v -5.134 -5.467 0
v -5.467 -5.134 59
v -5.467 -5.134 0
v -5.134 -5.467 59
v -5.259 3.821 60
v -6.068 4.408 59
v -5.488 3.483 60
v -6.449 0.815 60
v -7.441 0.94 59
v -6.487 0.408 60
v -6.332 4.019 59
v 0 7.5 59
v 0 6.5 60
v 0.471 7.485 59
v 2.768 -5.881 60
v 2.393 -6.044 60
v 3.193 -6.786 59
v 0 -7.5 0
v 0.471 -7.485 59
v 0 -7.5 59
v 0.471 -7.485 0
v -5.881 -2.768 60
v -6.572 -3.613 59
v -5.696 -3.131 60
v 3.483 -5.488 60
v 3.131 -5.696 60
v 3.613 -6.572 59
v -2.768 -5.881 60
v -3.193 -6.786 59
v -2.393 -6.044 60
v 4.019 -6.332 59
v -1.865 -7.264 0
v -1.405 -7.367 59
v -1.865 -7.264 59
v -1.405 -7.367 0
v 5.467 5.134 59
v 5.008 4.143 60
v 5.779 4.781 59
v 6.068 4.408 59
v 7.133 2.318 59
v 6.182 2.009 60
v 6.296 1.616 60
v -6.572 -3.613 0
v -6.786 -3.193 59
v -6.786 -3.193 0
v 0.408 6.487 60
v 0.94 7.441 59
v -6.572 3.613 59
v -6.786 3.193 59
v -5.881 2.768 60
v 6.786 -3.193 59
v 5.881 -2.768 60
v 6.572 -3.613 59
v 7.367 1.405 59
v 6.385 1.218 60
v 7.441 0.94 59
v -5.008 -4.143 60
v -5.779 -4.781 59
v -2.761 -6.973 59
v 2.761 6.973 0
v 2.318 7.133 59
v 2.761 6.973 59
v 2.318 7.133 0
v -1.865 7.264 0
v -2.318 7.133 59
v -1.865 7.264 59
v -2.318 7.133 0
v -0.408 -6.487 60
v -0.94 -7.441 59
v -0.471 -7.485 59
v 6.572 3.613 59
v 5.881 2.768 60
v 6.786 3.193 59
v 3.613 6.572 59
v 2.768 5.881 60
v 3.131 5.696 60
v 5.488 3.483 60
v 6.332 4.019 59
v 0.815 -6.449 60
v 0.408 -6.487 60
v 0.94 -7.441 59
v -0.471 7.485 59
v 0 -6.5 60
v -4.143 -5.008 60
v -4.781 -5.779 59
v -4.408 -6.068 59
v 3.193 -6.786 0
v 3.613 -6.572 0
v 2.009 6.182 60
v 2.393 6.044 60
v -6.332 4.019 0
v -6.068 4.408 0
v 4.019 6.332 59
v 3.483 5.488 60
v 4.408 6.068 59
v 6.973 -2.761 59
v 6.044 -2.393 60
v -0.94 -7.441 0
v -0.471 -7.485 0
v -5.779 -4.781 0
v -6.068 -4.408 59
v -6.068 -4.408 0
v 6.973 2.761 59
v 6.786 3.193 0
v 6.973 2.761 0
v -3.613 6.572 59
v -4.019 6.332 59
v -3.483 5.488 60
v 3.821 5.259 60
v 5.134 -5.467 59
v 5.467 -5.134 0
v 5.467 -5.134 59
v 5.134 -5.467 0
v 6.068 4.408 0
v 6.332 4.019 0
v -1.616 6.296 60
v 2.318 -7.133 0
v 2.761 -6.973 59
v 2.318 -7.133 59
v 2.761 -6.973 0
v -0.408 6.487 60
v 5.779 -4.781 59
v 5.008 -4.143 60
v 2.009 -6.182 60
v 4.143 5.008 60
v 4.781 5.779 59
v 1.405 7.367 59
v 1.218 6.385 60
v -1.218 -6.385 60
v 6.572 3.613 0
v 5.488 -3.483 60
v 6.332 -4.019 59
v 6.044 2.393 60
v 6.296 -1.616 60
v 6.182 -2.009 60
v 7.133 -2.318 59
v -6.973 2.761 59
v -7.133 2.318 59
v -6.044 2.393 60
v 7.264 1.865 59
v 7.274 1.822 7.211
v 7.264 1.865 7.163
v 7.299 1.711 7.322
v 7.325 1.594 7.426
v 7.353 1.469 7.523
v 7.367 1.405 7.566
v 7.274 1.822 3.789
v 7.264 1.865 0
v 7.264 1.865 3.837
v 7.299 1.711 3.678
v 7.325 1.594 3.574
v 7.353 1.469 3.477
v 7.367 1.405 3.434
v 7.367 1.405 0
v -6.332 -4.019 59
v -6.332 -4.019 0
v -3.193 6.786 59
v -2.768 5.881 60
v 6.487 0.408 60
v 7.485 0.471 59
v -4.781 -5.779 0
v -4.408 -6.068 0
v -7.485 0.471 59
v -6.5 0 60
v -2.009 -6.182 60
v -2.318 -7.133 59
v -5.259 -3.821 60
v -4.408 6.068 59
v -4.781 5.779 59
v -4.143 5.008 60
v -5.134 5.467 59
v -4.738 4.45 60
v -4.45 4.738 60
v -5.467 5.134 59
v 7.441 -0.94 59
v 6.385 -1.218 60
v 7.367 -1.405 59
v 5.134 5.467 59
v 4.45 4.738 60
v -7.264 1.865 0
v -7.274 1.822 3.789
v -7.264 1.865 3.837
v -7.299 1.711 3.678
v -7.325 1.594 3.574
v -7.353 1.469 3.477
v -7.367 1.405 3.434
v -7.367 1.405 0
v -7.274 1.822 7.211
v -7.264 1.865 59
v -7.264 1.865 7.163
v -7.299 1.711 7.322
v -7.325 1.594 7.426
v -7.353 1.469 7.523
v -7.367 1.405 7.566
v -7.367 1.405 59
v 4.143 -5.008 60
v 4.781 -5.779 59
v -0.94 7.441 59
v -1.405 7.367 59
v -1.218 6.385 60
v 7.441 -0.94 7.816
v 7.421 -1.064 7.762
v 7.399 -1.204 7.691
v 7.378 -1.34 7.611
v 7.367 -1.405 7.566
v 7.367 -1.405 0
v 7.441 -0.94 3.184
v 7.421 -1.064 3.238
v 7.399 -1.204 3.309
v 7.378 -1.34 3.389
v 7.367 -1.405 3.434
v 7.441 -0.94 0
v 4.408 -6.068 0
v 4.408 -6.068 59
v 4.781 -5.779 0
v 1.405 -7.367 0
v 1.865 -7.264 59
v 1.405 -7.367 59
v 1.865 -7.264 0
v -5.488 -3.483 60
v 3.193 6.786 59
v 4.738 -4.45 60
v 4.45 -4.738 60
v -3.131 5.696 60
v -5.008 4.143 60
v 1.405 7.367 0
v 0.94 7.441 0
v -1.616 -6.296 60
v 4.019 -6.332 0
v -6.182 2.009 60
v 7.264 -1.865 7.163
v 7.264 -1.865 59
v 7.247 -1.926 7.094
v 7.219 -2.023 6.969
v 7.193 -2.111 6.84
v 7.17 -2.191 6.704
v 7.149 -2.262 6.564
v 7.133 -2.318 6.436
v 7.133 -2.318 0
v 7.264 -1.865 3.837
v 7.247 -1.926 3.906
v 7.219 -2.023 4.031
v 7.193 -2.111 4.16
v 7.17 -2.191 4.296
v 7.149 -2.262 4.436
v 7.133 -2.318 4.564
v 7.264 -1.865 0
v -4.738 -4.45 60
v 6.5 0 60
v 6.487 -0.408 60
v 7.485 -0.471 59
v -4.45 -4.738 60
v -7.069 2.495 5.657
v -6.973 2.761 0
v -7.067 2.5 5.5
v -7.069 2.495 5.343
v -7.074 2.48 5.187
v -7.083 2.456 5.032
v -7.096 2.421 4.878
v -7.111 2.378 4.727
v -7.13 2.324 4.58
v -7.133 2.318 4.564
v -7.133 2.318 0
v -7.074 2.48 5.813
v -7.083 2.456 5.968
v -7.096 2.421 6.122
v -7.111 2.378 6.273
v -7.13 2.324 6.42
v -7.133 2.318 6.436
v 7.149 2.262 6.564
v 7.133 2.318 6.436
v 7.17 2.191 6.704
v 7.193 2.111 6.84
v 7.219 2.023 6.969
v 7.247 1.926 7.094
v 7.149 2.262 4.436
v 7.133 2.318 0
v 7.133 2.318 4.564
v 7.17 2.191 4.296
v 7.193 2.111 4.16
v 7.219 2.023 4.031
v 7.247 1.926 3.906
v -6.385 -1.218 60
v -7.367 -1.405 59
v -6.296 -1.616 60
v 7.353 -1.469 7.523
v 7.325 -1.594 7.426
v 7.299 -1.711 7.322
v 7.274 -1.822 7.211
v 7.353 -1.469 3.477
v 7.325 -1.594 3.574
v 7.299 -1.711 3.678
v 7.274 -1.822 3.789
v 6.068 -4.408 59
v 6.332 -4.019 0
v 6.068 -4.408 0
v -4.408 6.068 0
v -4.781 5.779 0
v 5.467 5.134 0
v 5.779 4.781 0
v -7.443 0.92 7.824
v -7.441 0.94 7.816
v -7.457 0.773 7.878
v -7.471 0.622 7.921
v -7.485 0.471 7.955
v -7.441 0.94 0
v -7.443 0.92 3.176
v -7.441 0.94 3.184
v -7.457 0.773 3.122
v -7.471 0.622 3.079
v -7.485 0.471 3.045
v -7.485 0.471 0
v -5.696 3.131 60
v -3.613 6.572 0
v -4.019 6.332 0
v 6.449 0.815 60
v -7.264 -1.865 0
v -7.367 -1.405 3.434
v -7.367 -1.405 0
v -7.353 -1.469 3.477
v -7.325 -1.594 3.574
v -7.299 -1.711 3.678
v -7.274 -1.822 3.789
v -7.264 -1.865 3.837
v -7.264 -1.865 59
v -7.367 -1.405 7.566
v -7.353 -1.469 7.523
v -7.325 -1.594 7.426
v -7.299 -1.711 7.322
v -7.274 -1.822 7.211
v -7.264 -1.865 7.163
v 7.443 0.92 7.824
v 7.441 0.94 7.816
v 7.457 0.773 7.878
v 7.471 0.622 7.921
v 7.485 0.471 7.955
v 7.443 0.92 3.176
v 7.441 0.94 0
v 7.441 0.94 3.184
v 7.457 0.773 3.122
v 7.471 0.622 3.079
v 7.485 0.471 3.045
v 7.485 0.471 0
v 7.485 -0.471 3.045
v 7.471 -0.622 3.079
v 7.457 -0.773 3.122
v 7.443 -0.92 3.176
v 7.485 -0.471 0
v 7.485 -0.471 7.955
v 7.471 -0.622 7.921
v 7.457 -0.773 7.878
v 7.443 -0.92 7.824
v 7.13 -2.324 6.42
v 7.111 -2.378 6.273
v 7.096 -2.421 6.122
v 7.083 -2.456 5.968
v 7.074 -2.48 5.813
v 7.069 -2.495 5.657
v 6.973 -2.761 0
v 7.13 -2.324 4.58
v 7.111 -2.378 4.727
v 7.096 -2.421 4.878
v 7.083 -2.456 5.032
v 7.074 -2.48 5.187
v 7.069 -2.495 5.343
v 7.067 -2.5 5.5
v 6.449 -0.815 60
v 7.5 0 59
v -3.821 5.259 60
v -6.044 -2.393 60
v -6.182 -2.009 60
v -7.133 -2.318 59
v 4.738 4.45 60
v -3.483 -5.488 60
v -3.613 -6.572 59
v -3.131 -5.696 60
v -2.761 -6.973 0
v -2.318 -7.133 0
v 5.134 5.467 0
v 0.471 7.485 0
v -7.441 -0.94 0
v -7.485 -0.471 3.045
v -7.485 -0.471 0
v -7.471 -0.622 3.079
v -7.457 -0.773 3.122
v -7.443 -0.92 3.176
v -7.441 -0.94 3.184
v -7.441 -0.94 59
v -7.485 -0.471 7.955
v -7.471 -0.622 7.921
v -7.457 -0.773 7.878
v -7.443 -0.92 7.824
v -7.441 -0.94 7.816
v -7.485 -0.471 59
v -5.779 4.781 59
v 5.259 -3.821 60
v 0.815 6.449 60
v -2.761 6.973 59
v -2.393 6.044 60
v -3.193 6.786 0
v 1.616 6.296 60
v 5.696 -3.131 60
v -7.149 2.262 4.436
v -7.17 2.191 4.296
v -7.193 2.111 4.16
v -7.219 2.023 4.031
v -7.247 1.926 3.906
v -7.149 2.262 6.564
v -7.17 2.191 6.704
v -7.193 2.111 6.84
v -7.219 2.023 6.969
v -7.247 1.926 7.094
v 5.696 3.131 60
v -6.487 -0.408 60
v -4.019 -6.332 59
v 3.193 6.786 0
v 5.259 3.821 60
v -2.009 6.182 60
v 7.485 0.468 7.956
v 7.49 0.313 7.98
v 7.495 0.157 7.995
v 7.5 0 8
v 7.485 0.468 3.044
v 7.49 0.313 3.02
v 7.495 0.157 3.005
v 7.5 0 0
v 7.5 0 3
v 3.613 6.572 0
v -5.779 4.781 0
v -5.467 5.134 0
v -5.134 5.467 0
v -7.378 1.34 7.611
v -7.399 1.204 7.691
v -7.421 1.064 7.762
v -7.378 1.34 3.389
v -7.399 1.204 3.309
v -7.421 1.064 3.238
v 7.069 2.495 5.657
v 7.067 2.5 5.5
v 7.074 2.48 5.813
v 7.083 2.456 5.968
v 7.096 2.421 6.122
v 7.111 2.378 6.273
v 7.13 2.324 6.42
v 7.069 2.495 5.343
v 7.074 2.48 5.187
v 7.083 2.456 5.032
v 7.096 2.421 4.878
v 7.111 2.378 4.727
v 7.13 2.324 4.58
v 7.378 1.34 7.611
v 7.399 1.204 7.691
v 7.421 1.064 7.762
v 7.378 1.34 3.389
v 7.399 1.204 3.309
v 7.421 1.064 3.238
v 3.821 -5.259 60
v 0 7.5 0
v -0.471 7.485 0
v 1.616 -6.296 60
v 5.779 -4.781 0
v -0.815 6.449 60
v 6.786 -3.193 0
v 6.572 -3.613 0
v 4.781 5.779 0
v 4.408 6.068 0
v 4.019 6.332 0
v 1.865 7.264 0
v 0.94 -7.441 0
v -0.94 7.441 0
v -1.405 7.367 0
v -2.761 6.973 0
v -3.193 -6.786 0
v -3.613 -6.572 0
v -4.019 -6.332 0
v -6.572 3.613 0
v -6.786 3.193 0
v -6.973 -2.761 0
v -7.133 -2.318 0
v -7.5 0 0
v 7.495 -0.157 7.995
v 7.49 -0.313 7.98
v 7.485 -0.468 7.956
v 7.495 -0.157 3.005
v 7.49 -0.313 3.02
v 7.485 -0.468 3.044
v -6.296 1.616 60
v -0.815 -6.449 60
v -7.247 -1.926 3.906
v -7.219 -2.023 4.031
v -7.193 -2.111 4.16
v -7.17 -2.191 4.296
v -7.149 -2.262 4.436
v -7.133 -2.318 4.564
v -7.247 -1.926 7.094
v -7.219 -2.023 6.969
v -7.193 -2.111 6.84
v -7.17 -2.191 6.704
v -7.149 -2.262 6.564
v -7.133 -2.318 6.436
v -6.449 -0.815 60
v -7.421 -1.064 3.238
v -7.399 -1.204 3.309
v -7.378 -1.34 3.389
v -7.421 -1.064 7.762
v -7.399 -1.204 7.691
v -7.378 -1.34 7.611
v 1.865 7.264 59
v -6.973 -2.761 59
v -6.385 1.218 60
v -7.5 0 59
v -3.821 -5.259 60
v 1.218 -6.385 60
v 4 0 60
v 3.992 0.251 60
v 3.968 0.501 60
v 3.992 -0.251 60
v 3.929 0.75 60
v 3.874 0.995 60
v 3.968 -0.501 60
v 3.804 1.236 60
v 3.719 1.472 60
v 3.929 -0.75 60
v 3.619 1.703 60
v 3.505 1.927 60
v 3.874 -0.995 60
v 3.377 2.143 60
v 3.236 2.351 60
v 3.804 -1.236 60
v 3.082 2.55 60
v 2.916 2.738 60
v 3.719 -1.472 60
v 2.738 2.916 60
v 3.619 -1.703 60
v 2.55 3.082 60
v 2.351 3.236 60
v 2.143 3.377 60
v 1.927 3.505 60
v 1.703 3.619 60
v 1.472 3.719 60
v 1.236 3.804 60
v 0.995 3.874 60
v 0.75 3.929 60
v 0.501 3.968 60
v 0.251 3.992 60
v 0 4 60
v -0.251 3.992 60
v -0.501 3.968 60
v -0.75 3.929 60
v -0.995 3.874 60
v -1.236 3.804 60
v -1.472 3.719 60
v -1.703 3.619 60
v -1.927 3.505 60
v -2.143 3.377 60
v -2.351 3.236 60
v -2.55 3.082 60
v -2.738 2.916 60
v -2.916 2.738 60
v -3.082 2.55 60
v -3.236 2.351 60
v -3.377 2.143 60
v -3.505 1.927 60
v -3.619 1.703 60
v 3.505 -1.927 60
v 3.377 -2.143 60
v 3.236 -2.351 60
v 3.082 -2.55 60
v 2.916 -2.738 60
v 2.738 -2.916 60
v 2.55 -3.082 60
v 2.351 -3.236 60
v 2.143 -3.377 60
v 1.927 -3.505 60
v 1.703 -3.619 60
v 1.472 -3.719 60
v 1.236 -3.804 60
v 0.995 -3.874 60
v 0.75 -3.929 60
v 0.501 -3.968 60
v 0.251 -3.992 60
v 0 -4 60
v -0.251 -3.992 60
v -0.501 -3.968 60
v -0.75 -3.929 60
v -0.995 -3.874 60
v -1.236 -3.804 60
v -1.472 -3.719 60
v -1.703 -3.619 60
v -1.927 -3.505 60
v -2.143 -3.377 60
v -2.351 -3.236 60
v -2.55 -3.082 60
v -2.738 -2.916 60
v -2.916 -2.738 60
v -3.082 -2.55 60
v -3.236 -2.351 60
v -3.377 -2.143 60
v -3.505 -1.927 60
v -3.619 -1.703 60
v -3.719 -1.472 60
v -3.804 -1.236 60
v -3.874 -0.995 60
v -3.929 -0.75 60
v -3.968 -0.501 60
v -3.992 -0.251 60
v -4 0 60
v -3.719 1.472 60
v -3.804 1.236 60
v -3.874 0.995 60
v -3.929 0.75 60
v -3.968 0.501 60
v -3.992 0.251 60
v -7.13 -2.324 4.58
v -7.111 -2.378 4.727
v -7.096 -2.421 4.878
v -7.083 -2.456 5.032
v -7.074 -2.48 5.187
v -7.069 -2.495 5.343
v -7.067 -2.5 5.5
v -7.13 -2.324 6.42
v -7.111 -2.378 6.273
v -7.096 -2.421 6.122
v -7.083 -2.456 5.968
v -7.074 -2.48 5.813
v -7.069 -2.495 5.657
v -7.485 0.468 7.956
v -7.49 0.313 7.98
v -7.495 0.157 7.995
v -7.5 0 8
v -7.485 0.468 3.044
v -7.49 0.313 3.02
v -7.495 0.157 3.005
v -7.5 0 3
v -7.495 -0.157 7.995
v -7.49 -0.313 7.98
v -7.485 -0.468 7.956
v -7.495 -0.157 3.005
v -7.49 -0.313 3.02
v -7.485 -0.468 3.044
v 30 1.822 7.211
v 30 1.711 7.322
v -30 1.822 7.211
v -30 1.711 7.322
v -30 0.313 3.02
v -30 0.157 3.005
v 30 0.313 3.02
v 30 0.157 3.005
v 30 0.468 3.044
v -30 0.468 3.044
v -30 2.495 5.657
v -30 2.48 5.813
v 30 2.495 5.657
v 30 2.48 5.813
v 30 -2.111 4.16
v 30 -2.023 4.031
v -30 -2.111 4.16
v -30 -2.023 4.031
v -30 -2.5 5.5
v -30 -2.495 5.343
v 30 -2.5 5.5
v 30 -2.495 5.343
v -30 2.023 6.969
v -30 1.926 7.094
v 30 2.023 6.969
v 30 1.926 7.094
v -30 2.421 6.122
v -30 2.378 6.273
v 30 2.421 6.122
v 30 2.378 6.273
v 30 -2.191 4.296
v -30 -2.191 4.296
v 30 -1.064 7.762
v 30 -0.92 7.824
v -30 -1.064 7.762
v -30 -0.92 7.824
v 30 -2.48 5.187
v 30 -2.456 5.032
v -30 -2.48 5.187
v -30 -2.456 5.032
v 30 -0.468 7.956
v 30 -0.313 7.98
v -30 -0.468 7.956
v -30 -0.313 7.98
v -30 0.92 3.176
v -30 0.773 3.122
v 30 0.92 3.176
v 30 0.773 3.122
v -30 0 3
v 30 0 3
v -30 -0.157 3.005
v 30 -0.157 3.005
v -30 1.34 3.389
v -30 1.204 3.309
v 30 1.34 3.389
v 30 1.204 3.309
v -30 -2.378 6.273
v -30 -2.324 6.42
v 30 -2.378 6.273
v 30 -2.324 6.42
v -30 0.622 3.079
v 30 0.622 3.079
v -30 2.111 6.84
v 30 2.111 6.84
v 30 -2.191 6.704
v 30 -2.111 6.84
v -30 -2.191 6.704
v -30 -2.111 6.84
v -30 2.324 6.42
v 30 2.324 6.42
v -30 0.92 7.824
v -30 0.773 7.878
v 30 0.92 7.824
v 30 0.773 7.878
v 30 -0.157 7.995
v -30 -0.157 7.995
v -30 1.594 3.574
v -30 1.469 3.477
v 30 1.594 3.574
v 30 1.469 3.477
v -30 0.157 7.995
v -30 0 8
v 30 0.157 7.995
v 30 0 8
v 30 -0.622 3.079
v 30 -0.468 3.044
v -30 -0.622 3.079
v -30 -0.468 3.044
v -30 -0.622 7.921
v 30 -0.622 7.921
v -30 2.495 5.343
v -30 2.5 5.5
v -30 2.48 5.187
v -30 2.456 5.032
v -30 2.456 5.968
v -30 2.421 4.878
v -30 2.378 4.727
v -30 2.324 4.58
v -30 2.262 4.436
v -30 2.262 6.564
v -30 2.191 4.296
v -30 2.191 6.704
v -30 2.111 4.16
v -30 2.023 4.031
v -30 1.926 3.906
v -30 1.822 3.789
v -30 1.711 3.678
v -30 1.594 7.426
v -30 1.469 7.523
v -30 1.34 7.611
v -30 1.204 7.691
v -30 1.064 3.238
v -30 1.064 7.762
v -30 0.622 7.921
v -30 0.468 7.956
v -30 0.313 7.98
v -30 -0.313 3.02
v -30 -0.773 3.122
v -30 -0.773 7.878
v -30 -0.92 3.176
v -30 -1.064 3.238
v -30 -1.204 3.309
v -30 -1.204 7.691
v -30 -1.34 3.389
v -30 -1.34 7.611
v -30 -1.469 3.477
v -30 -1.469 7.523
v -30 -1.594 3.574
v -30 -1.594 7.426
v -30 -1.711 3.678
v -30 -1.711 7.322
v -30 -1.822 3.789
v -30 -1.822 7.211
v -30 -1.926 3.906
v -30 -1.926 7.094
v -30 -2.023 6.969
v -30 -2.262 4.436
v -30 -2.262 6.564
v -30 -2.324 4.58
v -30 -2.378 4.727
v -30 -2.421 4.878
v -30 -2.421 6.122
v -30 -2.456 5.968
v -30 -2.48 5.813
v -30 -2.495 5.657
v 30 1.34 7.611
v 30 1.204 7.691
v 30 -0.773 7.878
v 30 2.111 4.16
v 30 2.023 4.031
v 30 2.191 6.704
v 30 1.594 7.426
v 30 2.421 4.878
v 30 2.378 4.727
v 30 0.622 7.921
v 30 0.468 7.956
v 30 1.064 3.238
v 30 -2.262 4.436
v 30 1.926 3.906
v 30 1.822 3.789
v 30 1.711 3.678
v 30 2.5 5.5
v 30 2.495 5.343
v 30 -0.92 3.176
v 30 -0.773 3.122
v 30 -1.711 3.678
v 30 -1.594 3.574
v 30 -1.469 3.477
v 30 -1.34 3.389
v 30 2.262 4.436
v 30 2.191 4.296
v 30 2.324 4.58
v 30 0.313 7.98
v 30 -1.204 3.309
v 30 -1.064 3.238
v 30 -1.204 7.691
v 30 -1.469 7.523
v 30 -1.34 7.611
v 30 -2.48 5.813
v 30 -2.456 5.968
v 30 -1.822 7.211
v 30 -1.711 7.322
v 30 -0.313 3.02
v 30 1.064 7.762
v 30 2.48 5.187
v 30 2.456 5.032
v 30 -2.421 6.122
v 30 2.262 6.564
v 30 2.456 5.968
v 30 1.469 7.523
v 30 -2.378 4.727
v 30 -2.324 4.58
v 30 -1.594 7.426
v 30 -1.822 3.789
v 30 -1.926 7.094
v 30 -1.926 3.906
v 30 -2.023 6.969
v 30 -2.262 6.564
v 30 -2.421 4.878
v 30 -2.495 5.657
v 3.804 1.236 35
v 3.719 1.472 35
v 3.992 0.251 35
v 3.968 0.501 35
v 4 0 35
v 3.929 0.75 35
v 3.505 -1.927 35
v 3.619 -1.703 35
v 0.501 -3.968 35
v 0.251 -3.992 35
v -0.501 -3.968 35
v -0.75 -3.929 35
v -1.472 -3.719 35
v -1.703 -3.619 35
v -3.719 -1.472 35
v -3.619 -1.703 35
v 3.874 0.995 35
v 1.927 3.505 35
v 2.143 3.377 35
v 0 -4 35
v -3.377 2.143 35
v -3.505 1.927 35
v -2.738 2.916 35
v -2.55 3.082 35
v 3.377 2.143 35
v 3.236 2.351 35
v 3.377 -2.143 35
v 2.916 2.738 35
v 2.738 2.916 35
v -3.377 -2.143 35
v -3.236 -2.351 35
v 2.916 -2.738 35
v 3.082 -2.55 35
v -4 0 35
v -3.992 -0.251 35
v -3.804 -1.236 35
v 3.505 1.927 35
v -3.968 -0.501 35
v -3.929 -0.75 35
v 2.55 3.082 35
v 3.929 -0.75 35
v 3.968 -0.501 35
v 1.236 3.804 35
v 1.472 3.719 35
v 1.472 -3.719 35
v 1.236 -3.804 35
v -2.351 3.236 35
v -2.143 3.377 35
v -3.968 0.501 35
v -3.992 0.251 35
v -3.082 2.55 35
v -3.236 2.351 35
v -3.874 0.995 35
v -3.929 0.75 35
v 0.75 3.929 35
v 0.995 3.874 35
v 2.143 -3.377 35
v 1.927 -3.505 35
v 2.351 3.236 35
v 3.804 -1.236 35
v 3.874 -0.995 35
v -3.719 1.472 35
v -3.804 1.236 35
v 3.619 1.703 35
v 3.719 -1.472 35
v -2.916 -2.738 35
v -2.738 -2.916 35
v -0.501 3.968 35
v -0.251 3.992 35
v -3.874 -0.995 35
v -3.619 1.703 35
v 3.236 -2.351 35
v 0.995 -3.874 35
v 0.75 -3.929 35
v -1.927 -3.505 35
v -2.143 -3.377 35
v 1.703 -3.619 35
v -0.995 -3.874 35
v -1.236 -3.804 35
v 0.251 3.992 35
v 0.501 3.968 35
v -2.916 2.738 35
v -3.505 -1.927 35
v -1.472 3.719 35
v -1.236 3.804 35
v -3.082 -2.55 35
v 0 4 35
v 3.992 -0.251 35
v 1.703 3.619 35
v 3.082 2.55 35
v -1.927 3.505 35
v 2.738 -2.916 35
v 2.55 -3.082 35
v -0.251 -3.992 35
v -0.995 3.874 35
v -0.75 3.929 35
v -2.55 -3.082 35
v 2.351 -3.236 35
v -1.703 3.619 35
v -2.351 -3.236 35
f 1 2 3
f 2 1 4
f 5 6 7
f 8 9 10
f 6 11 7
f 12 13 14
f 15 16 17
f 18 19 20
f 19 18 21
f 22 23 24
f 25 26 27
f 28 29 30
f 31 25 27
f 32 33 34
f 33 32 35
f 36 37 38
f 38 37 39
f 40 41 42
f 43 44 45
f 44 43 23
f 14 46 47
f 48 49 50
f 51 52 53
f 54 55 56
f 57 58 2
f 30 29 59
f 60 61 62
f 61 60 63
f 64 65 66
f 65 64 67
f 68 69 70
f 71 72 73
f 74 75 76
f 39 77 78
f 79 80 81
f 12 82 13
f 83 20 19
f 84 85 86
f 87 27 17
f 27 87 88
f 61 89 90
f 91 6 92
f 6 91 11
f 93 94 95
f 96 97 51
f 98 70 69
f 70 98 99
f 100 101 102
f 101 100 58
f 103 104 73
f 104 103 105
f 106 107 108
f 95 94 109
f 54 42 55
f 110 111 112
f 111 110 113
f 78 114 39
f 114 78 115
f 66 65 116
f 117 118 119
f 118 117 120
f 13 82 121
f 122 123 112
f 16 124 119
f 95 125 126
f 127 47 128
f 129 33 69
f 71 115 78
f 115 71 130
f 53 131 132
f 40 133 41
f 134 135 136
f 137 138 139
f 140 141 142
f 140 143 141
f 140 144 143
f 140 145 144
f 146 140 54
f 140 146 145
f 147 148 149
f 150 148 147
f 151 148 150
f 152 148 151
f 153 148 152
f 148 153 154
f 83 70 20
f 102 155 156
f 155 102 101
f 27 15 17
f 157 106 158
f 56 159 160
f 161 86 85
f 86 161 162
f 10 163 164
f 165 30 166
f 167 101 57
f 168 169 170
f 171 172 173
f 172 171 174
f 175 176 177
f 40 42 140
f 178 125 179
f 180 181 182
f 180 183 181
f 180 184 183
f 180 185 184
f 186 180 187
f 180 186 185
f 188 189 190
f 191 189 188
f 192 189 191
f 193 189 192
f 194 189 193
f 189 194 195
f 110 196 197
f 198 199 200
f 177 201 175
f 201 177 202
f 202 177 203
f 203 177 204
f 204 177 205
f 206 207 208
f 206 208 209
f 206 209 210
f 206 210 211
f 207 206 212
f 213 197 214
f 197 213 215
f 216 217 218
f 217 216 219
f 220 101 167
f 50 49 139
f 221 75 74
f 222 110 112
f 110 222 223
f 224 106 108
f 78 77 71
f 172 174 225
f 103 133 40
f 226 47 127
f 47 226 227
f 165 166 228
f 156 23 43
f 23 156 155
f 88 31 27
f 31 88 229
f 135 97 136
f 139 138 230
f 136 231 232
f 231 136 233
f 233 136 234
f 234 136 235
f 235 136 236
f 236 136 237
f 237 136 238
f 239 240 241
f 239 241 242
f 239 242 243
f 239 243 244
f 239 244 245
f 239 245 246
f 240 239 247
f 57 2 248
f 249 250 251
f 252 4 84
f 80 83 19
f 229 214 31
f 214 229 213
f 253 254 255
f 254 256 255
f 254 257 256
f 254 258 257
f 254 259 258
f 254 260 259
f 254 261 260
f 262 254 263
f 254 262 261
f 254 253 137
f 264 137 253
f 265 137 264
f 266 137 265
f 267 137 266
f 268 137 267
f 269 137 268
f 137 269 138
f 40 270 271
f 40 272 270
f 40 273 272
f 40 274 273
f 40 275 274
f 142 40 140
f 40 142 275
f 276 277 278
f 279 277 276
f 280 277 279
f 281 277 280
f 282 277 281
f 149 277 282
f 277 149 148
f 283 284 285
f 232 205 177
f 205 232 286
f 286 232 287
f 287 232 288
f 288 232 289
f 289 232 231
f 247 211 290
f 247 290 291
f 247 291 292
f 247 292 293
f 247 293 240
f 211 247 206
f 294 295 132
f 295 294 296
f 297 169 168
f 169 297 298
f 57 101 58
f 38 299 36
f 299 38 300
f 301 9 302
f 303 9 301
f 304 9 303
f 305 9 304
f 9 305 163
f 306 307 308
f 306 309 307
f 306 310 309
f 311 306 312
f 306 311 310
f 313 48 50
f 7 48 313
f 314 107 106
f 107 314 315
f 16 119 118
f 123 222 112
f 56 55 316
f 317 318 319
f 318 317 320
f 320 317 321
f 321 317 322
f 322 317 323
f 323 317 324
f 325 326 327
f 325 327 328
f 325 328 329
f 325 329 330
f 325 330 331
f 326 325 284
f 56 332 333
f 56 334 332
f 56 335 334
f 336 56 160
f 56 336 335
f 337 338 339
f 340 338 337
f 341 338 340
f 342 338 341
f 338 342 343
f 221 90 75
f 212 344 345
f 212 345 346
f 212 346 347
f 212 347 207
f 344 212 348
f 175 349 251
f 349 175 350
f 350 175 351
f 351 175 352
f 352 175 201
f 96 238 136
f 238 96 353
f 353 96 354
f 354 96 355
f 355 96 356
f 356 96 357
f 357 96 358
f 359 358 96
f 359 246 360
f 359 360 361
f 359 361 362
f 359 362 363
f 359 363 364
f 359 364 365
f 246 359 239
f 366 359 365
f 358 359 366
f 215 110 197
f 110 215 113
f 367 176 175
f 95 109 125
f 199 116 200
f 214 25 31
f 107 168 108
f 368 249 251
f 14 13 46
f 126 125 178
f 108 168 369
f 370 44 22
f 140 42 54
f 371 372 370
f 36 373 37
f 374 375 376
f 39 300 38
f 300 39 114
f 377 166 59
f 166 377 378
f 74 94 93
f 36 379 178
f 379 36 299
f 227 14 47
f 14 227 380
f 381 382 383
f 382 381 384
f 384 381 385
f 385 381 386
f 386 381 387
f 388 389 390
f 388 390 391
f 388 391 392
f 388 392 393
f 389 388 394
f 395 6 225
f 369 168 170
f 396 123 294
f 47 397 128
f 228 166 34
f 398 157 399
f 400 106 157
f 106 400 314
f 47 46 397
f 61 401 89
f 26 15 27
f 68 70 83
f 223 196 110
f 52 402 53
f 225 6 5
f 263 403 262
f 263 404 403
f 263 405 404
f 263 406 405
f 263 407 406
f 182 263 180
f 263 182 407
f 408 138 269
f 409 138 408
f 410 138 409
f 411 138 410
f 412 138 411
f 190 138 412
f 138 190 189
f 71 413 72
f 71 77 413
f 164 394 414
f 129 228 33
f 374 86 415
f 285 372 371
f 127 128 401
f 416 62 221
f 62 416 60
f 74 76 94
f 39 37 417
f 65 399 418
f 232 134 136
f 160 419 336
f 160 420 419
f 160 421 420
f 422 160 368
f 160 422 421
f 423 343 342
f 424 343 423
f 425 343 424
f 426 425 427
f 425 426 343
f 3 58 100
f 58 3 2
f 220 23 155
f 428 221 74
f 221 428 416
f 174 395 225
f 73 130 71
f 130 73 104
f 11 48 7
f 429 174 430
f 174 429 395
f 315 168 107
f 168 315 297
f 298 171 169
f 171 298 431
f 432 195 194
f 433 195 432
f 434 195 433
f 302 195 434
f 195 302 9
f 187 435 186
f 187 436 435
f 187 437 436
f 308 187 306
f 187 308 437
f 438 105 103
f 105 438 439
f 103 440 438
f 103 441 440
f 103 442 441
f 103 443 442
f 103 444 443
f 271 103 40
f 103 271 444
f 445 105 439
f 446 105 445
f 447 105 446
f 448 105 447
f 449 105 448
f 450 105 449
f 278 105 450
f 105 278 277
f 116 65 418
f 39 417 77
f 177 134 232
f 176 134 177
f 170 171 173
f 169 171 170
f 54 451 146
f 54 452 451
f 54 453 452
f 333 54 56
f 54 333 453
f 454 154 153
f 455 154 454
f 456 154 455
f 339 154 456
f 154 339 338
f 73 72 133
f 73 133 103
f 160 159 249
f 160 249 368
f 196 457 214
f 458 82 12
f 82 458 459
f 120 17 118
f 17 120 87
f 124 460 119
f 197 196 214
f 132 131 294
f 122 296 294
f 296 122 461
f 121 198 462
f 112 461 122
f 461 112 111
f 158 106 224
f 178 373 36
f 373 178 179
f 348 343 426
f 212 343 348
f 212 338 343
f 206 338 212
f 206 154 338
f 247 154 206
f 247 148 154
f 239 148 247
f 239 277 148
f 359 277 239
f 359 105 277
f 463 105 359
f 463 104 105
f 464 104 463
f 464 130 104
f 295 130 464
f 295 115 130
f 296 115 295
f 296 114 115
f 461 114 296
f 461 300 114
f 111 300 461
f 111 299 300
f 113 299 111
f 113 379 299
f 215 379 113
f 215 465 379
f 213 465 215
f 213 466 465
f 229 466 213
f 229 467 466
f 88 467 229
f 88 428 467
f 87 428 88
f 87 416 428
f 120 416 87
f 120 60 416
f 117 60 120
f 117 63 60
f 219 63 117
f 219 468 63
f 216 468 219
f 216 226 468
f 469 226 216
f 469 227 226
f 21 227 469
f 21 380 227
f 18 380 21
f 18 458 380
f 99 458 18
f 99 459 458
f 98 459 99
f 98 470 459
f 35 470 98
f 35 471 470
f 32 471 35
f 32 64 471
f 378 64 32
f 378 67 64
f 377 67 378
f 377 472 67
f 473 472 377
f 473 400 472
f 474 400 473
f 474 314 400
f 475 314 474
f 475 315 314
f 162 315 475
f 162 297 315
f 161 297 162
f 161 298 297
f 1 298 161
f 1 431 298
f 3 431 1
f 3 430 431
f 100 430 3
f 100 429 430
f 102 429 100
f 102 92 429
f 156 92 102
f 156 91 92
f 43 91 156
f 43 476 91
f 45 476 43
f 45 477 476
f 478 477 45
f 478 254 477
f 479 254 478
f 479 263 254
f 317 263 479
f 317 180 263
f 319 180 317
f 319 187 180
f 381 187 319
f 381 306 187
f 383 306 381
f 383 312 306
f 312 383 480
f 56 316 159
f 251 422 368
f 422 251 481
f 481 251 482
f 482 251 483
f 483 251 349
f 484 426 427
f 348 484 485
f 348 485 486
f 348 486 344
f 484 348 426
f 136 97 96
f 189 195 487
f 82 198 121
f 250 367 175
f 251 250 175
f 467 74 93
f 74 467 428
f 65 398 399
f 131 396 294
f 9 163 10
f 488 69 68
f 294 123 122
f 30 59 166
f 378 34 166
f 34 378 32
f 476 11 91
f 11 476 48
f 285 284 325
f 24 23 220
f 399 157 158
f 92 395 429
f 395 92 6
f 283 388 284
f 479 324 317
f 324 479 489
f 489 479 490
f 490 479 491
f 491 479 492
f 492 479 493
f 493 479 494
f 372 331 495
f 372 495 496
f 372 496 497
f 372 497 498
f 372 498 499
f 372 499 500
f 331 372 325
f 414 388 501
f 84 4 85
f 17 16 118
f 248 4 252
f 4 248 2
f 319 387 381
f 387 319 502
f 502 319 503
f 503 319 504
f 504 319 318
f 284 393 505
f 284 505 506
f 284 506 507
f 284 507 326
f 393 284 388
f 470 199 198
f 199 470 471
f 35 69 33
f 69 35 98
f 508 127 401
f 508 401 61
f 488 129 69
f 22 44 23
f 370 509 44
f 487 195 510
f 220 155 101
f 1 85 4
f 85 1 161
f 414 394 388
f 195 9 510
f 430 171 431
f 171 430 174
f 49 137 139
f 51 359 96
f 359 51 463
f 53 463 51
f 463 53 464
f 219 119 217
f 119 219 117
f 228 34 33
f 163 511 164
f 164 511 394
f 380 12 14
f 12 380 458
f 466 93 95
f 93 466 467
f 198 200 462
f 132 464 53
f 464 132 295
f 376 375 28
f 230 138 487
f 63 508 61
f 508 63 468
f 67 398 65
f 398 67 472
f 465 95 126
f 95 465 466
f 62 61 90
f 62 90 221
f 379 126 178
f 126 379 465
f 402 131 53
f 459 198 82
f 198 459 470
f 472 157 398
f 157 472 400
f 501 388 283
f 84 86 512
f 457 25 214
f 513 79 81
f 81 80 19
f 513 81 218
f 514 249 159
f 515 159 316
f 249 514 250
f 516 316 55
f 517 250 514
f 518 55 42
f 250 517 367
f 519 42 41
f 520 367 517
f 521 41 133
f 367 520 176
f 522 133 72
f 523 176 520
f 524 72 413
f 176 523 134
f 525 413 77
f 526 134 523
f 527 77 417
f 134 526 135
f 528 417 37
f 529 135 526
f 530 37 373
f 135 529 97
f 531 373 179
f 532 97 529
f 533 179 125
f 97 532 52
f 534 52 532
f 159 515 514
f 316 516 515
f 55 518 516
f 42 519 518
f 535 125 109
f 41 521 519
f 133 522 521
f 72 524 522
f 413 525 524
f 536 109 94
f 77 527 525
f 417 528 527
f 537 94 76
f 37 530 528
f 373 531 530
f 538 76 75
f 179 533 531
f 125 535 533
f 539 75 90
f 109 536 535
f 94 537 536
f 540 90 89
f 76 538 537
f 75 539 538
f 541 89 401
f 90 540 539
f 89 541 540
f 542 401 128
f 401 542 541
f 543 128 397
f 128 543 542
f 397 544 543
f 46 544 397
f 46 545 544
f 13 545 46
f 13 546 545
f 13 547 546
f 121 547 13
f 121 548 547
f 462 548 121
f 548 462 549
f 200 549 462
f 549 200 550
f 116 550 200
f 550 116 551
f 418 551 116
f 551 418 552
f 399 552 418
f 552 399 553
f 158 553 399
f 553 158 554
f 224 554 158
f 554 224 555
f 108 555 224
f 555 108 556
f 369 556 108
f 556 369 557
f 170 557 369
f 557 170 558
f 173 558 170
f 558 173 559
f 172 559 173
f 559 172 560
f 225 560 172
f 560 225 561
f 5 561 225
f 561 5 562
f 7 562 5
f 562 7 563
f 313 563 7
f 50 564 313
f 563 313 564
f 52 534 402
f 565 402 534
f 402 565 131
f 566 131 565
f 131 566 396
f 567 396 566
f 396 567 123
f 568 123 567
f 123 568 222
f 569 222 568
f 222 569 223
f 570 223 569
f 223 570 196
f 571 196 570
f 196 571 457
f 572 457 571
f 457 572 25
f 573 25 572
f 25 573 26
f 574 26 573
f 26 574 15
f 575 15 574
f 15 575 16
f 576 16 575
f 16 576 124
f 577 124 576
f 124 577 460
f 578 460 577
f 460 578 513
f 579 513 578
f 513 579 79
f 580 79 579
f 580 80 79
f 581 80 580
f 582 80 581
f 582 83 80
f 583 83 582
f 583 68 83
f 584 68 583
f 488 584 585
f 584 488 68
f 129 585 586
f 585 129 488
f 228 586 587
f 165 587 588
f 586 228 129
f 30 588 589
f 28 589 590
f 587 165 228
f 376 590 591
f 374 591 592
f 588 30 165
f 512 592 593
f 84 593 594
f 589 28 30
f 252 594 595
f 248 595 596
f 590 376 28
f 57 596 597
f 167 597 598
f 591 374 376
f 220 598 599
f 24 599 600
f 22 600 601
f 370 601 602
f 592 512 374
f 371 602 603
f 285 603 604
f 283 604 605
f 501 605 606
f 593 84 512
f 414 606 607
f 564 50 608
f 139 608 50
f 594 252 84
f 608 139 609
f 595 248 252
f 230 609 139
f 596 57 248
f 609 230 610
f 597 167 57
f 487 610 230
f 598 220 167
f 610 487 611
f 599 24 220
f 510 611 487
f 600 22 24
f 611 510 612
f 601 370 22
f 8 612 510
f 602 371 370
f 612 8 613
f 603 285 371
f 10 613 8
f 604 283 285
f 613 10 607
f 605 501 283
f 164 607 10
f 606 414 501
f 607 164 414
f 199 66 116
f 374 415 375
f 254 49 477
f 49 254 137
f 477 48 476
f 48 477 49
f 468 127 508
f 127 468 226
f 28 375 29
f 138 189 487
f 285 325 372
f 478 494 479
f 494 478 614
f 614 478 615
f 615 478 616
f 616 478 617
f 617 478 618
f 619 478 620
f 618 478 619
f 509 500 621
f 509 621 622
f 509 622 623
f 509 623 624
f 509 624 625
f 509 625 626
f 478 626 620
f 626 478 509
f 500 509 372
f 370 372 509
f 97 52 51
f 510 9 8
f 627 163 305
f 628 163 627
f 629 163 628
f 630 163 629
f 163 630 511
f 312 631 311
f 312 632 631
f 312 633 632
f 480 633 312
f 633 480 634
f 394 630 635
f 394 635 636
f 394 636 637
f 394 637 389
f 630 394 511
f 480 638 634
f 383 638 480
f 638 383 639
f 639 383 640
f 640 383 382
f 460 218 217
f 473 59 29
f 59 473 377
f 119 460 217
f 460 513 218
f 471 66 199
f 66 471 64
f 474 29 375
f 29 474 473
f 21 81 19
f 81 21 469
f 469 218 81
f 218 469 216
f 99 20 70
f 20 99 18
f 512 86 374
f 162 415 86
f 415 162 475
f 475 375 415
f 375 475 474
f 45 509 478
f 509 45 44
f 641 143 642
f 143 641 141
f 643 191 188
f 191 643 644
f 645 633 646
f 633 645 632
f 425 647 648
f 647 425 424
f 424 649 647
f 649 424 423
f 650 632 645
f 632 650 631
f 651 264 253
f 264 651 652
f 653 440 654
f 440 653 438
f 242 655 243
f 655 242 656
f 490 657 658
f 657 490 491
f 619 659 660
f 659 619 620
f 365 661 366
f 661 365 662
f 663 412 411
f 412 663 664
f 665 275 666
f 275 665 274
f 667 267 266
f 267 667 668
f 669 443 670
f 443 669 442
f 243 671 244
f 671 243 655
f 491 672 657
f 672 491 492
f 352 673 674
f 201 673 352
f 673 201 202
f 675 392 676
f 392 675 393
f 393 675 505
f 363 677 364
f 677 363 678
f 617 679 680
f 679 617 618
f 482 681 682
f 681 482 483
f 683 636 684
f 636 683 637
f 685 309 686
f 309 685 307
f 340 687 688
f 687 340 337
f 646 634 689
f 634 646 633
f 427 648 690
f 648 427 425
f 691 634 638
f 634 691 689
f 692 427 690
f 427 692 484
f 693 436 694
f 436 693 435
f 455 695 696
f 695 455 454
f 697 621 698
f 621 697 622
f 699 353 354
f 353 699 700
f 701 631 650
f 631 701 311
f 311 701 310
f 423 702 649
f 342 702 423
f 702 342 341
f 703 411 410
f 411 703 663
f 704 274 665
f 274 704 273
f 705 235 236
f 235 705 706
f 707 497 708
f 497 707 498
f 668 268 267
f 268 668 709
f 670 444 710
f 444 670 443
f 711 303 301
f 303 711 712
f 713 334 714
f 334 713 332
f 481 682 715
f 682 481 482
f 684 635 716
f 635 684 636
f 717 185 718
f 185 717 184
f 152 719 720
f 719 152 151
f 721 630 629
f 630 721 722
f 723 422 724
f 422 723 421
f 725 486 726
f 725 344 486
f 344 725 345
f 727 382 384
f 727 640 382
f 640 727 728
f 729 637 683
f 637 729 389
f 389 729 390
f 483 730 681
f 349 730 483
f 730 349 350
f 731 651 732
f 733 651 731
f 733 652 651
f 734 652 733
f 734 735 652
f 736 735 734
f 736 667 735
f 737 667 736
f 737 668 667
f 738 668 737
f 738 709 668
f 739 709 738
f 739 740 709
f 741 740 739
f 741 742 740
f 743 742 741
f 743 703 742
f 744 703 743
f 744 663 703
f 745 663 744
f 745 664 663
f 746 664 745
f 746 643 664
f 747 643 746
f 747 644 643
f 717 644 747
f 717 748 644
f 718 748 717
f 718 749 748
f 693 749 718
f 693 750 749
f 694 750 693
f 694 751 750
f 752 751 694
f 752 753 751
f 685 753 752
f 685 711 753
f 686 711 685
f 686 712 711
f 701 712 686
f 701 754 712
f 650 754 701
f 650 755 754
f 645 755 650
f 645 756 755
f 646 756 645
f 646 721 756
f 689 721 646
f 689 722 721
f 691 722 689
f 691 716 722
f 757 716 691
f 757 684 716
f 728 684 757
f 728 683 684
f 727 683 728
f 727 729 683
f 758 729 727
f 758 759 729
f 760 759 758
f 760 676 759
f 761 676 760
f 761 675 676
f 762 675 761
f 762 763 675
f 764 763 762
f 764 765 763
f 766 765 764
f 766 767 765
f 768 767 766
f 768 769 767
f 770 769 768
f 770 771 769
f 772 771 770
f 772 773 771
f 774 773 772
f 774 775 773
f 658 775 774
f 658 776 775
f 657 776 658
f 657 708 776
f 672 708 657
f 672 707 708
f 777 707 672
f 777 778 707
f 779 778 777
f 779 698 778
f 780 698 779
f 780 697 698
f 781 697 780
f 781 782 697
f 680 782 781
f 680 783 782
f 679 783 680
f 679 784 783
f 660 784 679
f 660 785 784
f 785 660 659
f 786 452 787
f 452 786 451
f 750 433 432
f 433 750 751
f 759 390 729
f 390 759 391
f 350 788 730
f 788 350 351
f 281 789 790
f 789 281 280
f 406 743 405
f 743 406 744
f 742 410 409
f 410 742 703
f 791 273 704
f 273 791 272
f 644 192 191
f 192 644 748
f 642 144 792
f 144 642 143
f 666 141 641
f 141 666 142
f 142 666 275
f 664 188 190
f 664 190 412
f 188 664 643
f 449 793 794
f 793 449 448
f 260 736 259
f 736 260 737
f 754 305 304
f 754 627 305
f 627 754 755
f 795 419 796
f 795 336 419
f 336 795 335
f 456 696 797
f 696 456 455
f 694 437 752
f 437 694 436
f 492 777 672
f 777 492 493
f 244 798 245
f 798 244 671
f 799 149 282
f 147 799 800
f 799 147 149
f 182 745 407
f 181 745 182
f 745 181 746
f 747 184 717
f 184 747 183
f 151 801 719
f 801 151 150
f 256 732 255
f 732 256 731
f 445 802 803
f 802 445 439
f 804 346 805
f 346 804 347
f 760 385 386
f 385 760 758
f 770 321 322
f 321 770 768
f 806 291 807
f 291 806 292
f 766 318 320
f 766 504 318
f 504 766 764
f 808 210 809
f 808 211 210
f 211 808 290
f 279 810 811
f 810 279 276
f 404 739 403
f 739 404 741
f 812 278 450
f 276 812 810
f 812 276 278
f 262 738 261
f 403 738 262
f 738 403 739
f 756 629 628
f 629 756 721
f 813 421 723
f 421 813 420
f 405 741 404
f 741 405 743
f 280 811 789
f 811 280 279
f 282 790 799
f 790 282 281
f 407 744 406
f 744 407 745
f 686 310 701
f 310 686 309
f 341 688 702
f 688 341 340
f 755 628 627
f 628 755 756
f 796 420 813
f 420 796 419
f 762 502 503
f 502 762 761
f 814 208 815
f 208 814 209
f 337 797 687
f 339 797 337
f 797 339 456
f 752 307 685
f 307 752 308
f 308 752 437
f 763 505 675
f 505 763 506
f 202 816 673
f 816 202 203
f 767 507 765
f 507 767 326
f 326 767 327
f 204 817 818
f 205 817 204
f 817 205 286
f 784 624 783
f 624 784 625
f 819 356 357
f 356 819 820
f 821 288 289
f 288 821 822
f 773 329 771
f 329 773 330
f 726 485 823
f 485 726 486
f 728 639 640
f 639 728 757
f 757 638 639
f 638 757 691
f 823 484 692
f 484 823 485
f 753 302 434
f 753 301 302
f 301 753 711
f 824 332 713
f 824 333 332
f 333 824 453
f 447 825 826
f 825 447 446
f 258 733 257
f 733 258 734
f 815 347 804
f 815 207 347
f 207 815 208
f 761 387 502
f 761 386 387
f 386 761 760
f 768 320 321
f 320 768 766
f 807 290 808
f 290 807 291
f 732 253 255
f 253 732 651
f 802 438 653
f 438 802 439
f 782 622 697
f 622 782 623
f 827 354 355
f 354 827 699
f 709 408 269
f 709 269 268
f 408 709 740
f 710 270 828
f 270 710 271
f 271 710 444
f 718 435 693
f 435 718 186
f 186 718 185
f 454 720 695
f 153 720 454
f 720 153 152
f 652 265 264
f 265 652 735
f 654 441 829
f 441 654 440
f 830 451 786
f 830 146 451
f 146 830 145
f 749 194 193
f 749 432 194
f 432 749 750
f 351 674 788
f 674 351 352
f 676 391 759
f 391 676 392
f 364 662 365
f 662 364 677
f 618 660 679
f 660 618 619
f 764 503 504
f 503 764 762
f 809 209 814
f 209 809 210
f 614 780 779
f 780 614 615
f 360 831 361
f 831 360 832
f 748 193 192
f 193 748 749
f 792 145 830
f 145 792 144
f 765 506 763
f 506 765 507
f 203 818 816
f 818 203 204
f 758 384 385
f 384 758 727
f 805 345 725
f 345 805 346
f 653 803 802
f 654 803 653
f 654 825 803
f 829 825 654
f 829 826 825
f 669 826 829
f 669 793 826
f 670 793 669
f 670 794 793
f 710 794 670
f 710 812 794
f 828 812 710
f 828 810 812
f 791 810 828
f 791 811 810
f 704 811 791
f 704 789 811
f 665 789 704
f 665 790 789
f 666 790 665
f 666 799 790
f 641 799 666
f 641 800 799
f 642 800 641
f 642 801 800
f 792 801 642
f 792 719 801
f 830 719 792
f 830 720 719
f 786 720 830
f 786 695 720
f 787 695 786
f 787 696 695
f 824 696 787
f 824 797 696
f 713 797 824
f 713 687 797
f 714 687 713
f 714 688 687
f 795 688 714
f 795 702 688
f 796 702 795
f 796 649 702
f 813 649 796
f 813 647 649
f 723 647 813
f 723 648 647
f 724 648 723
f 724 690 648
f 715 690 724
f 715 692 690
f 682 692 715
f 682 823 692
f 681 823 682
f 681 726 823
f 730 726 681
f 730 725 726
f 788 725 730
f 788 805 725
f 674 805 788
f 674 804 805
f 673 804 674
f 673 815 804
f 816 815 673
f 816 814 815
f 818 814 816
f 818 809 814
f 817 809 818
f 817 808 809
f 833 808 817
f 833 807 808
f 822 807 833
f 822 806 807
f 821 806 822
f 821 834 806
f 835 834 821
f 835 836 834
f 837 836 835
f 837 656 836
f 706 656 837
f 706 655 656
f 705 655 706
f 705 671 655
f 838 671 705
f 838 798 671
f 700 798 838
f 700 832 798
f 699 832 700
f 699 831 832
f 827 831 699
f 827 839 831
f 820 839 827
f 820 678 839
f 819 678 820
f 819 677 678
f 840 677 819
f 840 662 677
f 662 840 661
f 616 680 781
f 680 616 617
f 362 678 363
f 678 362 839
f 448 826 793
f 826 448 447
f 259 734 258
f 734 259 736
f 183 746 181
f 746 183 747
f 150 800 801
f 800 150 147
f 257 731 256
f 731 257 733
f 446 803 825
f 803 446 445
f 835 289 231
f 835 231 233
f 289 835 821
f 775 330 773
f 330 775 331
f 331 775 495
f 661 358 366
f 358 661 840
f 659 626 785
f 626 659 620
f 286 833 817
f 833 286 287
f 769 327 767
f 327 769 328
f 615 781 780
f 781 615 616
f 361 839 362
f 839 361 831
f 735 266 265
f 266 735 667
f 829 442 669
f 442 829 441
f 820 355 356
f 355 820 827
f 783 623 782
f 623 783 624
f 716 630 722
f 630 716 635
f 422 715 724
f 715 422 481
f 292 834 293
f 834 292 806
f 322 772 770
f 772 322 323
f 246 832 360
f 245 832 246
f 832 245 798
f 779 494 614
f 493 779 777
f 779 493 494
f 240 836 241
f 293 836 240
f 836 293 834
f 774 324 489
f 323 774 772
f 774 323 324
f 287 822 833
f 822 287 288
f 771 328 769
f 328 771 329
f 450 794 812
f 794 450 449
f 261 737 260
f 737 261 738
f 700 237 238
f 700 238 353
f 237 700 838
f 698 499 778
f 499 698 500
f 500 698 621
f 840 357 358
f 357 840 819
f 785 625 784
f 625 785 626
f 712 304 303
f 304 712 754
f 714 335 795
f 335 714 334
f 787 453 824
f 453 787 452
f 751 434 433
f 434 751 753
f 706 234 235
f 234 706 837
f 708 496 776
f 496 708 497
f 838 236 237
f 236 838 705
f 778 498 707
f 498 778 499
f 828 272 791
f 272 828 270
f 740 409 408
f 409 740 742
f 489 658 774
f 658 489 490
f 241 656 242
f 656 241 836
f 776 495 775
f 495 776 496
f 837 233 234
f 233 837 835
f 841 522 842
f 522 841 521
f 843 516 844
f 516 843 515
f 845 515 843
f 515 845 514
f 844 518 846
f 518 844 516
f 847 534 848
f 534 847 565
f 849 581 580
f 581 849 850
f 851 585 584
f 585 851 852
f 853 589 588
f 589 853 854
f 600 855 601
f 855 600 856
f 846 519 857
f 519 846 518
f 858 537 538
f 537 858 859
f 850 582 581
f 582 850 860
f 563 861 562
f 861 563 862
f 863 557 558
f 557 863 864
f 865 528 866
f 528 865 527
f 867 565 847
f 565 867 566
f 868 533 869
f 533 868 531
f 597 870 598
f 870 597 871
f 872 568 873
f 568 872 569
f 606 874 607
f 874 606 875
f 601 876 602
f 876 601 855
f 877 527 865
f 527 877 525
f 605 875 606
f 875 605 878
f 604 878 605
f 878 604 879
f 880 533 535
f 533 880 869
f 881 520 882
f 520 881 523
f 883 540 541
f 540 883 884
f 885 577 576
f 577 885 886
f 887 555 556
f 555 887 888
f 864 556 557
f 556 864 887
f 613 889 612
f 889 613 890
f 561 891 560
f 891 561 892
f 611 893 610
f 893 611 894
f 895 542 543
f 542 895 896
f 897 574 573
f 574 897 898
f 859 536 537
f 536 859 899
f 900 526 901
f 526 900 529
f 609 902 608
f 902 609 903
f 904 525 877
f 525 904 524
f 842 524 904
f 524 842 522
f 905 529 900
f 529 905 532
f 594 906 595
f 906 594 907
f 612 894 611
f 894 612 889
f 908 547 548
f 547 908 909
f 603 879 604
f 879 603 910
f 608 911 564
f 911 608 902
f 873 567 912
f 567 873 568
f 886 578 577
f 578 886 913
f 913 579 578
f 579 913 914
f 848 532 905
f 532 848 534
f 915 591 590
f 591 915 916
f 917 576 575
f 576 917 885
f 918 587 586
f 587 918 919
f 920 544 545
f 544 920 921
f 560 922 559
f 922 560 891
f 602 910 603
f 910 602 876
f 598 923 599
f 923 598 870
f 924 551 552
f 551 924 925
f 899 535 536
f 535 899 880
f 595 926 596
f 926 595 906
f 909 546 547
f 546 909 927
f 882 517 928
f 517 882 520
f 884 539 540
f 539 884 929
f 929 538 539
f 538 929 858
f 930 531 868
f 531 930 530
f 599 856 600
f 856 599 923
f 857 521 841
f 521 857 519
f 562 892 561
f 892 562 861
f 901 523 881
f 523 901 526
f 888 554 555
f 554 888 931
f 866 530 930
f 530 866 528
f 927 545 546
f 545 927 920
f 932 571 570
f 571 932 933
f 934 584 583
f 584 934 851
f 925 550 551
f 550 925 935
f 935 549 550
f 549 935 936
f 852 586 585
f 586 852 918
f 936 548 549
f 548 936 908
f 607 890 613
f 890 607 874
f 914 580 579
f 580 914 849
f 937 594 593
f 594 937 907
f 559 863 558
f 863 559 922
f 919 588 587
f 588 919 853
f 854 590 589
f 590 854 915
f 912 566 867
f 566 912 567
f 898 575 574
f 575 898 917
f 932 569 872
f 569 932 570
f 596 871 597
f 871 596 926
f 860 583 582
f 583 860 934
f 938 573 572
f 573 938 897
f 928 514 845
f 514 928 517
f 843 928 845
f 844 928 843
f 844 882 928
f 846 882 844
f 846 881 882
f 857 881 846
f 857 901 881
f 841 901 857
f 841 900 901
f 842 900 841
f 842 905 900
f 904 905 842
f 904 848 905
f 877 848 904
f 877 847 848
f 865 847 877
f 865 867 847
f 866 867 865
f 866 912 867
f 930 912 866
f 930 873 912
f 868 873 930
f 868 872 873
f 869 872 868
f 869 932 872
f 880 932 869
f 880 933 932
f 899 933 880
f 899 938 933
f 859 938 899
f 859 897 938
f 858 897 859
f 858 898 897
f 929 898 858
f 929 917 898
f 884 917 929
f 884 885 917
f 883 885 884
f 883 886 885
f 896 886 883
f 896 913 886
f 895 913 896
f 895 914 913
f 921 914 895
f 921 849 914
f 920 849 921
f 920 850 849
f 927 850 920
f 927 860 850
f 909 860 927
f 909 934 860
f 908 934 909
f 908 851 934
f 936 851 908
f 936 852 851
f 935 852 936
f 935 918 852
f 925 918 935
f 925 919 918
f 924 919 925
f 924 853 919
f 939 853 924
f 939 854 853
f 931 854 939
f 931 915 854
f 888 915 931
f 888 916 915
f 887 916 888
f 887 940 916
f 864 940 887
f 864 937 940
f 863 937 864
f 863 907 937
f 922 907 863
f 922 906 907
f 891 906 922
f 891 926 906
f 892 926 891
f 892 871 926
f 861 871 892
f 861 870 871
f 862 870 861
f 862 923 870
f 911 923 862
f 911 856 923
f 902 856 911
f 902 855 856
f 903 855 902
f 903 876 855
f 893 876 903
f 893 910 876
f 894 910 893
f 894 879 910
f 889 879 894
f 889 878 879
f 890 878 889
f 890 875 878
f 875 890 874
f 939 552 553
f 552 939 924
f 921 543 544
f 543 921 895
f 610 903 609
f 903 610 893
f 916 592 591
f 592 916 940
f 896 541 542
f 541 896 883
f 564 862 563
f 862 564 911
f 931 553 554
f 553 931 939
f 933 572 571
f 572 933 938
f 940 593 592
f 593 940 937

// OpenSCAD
/* 
  T‑Handle Tap Holder 
  All dimensions are in millimetres.
  
  Geometry summary
  ----------------
  1. Shank      : Ø15 × 60 (Z) with a 1 mm 45° chamfer on the end that has the tap hole.
  2. Tap hole   : Ø8 × 25 deep, concentric with the shank, starting at the chamfered end.
  3. T‑handle   : Ø5 × 60, orthogonal to the shank (along X), centred 5.5 mm up from the opposite end.
  
  The resulting model is a single, watertight, manifold solid.
*/

$fn = 100;                         // Resolution for circular features

//---------------------------------
// Helper ‑ 45° chamfered cylinder
//---------------------------------
module chamfered_cylinder(r=7.5, h=60, chamfer=1)
{
    /*  Two coaxial cylinders are hulled together:
        – a full‑diameter body of height h‑chamfer
        – a reduced‑diameter top section of height chamfer
        The hull naturally forms the 45° chamfer.          */
    hull() {
        cylinder(r = r,           h = h - chamfer);
        translate([0, 0, h - chamfer])
            cylinder(r = r - chamfer, h = chamfer);
    }
}

//--------------------
// Core model
//--------------------
difference() {

    //--- SOLID: shank + T‑handle (union) ------------------
    union() {
        // Shank with 1 mm chamfer on the “tap” end (Z = 60)
        chamfered_cylinder(r = 7.5, h = 60, chamfer = 1);

        // T‑handle (Ø5 × 60) centred 5.5 mm from the opposite end (Z = 0)
        translate([0, 0, 5.5])
            rotate([0, 90, 0])      // orient along X axis
                cylinder(r = 2.5, h = 60, center = true);
    }

    //--- SUBTRACT: concentric tap hole --------------------
    /*  Extra 0.2 mm ensures a clean cut past the outer face */
    translate([0, 0, 60 - 25])
        cylinder(r = 4, h = 25 + 0.2);
}
